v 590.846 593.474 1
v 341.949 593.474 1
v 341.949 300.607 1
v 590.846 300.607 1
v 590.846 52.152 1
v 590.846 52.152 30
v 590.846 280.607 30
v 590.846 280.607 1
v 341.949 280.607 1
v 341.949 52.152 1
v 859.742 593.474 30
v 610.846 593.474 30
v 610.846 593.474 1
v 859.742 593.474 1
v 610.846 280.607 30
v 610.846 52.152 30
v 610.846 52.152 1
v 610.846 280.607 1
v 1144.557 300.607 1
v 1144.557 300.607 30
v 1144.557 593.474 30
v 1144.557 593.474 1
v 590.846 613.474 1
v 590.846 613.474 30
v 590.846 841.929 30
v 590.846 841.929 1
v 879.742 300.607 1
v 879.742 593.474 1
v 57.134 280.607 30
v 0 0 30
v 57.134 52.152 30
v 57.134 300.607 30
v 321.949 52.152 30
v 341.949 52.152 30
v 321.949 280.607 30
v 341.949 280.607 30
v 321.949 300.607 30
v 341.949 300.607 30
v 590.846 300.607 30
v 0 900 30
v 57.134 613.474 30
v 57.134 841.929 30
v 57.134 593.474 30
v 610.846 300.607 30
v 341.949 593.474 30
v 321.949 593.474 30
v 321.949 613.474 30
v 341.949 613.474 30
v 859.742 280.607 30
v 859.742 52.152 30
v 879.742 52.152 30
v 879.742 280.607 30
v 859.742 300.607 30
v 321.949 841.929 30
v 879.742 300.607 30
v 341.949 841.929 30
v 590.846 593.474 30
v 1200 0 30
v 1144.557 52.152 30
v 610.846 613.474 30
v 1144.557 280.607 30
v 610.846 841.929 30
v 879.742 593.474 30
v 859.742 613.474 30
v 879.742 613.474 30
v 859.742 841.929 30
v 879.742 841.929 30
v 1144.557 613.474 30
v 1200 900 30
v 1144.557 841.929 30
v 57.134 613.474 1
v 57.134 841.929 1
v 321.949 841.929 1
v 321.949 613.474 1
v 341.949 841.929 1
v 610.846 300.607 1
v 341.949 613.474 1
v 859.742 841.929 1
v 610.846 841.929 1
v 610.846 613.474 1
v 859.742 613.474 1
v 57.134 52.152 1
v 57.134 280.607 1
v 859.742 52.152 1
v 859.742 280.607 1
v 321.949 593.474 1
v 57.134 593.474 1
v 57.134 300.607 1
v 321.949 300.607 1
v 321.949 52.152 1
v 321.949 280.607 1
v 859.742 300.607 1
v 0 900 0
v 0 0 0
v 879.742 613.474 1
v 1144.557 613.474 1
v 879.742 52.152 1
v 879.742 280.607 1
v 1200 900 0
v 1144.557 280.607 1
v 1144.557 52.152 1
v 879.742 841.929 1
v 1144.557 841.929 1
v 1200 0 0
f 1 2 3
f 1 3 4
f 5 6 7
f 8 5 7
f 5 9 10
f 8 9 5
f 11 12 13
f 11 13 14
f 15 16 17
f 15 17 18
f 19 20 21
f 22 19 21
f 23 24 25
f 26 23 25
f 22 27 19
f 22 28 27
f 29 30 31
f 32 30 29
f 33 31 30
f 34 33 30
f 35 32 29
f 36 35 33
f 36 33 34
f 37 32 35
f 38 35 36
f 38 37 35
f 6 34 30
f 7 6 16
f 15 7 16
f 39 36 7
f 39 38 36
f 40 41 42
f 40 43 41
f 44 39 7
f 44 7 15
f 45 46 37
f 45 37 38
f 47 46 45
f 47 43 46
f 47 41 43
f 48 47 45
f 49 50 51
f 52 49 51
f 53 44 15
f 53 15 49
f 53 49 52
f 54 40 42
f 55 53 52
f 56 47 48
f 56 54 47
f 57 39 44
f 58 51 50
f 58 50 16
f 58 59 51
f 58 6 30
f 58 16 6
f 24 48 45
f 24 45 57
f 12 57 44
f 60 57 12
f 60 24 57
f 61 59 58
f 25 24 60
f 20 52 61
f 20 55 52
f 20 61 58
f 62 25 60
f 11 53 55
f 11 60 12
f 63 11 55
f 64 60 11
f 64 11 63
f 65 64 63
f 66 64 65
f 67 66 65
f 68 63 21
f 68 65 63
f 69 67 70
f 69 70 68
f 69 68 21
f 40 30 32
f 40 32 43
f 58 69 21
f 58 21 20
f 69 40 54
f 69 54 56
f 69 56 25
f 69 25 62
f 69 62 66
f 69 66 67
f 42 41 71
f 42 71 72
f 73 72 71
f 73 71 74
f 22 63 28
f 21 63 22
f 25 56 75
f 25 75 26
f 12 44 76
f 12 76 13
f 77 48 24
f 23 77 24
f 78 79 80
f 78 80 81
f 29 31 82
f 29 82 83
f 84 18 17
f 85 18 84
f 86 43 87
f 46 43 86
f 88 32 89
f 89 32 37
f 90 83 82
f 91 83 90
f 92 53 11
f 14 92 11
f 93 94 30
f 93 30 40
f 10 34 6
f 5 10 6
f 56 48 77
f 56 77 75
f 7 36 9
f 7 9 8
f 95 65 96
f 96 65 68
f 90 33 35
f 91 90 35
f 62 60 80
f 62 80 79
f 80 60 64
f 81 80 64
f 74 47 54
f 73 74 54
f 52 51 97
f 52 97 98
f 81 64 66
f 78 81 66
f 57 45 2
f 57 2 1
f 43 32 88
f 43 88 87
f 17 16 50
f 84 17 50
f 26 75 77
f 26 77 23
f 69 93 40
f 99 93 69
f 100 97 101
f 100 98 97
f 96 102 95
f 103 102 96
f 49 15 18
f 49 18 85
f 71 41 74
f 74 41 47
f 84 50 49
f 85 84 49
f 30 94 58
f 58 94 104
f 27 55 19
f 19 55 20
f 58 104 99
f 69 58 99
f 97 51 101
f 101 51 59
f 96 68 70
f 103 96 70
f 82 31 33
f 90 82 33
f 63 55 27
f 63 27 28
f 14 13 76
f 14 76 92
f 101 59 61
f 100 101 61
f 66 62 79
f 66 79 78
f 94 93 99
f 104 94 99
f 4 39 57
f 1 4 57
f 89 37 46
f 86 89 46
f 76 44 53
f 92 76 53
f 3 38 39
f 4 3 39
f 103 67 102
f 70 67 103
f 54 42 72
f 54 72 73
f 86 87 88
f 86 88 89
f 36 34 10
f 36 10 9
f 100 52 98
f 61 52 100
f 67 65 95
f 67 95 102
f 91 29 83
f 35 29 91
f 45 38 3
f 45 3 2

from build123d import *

# Parameters (mm, degrees)
SKETCH2_W           = 1200
SKETCH2_H           = 900
BOSS_EXTRUDE2_DEPTH = 30
SKETCH3_W           = 1087.423470631
SKETCH3_H           = 789.777232946
CUT_EXTRUDE2_DEPTH  = 29
RIB6_REACH          = 1502.3
SKETCH6_WALLS_W     = 20
SKETCH6_WALLS_H     = 3792.377172958
SKETCH6_WALLS_W_2   = 4090.023410643
SKETCH6_WALLS_H_2   = 20


with BuildPart() as part:
    # Sketch2 → Boss-Extrude2 (new body)
    with BuildSketch(Plane.XY):
        with Locations((600, 450)):
            Rectangle(SKETCH2_W, SKETCH2_H)
    extrude(amount=BOSS_EXTRUDE2_DEPTH)

    # Sketch3 → Cut-Extrude2 (cut)
    with BuildSketch(Plane.XY.offset(30)):
        with Locations((600.845585903, 447.040449341)):
            Rectangle(SKETCH3_W, SKETCH3_H)
    extrude(amount=-CUT_EXTRUDE2_DEPTH, mode=Mode.SUBTRACT)

    # Sketch6 walls → Rib6 (add, up to next)
    with BuildSketch(Plane.XY.offset(30), mode=Mode.PRIVATE) as rib6_sk1:
        with Locations((600.845585903, 447.040449341)):
            Rectangle(SKETCH6_WALLS_W, SKETCH6_WALLS_H)
    rib6_tool1 = extrude(rib6_sk1.sketch, amount=-RIB6_REACH, mode=Mode.PRIVATE) - part.part
    # Sketch6 walls → Rib6 (add, up to next)
    with BuildSketch(Plane.XY.offset(30), mode=Mode.PRIVATE) as rib6_sk2:
        with Locations((331.949268904, 447.040449341)):
            Rectangle(SKETCH6_WALLS_W, SKETCH6_WALLS_H)
    rib6_tool2 = extrude(rib6_sk2.sketch, amount=-RIB6_REACH, mode=Mode.PRIVATE) - part.part
    # Sketch6 walls → Rib6 (add, up to next)
    with BuildSketch(Plane.XY.offset(30), mode=Mode.PRIVATE) as rib6_sk3:
        with Locations((600.845585903, 603.473841306)):
            Rectangle(SKETCH6_WALLS_W_2, SKETCH6_WALLS_H_2)
    rib6_tool3 = extrude(rib6_sk3.sketch, amount=-RIB6_REACH, mode=Mode.PRIVATE) - part.part
    # Sketch6 walls → Rib6 (add, up to next)
    with BuildSketch(Plane.XY.offset(30), mode=Mode.PRIVATE) as rib6_sk4:
        with Locations((869.741902901, 447.040449341)):
            Rectangle(SKETCH6_WALLS_W, SKETCH6_WALLS_H)
    rib6_tool4 = extrude(rib6_sk4.sketch, amount=-RIB6_REACH, mode=Mode.PRIVATE) - part.part
    # Sketch6 walls → Rib6 (add, up to next)
    with BuildSketch(Plane.XY.offset(30), mode=Mode.PRIVATE) as rib6_sk5:
        with Locations((600.845585903, 290.607057376)):
            Rectangle(SKETCH6_WALLS_W_2, SKETCH6_WALLS_H_2)
    rib6_tool5 = extrude(rib6_sk5.sketch, amount=-RIB6_REACH, mode=Mode.PRIVATE) - part.part
    add(rib6_tool1.solids().sort_by_distance((600.845585903, 447.040449341, 30))[0])
    add(rib6_tool2.solids().sort_by_distance((331.949268904, 447.040449341, 30))[0])
    add(rib6_tool3.solids().sort_by_distance((600.845585903, 603.473841306, 30))[0])
    add(rib6_tool4.solids().sort_by_distance((869.741902901, 447.040449341, 30))[0])
    add(rib6_tool5.solids().sort_by_distance((600.845585903, 290.607057376, 30))[0])


solid = part.part
